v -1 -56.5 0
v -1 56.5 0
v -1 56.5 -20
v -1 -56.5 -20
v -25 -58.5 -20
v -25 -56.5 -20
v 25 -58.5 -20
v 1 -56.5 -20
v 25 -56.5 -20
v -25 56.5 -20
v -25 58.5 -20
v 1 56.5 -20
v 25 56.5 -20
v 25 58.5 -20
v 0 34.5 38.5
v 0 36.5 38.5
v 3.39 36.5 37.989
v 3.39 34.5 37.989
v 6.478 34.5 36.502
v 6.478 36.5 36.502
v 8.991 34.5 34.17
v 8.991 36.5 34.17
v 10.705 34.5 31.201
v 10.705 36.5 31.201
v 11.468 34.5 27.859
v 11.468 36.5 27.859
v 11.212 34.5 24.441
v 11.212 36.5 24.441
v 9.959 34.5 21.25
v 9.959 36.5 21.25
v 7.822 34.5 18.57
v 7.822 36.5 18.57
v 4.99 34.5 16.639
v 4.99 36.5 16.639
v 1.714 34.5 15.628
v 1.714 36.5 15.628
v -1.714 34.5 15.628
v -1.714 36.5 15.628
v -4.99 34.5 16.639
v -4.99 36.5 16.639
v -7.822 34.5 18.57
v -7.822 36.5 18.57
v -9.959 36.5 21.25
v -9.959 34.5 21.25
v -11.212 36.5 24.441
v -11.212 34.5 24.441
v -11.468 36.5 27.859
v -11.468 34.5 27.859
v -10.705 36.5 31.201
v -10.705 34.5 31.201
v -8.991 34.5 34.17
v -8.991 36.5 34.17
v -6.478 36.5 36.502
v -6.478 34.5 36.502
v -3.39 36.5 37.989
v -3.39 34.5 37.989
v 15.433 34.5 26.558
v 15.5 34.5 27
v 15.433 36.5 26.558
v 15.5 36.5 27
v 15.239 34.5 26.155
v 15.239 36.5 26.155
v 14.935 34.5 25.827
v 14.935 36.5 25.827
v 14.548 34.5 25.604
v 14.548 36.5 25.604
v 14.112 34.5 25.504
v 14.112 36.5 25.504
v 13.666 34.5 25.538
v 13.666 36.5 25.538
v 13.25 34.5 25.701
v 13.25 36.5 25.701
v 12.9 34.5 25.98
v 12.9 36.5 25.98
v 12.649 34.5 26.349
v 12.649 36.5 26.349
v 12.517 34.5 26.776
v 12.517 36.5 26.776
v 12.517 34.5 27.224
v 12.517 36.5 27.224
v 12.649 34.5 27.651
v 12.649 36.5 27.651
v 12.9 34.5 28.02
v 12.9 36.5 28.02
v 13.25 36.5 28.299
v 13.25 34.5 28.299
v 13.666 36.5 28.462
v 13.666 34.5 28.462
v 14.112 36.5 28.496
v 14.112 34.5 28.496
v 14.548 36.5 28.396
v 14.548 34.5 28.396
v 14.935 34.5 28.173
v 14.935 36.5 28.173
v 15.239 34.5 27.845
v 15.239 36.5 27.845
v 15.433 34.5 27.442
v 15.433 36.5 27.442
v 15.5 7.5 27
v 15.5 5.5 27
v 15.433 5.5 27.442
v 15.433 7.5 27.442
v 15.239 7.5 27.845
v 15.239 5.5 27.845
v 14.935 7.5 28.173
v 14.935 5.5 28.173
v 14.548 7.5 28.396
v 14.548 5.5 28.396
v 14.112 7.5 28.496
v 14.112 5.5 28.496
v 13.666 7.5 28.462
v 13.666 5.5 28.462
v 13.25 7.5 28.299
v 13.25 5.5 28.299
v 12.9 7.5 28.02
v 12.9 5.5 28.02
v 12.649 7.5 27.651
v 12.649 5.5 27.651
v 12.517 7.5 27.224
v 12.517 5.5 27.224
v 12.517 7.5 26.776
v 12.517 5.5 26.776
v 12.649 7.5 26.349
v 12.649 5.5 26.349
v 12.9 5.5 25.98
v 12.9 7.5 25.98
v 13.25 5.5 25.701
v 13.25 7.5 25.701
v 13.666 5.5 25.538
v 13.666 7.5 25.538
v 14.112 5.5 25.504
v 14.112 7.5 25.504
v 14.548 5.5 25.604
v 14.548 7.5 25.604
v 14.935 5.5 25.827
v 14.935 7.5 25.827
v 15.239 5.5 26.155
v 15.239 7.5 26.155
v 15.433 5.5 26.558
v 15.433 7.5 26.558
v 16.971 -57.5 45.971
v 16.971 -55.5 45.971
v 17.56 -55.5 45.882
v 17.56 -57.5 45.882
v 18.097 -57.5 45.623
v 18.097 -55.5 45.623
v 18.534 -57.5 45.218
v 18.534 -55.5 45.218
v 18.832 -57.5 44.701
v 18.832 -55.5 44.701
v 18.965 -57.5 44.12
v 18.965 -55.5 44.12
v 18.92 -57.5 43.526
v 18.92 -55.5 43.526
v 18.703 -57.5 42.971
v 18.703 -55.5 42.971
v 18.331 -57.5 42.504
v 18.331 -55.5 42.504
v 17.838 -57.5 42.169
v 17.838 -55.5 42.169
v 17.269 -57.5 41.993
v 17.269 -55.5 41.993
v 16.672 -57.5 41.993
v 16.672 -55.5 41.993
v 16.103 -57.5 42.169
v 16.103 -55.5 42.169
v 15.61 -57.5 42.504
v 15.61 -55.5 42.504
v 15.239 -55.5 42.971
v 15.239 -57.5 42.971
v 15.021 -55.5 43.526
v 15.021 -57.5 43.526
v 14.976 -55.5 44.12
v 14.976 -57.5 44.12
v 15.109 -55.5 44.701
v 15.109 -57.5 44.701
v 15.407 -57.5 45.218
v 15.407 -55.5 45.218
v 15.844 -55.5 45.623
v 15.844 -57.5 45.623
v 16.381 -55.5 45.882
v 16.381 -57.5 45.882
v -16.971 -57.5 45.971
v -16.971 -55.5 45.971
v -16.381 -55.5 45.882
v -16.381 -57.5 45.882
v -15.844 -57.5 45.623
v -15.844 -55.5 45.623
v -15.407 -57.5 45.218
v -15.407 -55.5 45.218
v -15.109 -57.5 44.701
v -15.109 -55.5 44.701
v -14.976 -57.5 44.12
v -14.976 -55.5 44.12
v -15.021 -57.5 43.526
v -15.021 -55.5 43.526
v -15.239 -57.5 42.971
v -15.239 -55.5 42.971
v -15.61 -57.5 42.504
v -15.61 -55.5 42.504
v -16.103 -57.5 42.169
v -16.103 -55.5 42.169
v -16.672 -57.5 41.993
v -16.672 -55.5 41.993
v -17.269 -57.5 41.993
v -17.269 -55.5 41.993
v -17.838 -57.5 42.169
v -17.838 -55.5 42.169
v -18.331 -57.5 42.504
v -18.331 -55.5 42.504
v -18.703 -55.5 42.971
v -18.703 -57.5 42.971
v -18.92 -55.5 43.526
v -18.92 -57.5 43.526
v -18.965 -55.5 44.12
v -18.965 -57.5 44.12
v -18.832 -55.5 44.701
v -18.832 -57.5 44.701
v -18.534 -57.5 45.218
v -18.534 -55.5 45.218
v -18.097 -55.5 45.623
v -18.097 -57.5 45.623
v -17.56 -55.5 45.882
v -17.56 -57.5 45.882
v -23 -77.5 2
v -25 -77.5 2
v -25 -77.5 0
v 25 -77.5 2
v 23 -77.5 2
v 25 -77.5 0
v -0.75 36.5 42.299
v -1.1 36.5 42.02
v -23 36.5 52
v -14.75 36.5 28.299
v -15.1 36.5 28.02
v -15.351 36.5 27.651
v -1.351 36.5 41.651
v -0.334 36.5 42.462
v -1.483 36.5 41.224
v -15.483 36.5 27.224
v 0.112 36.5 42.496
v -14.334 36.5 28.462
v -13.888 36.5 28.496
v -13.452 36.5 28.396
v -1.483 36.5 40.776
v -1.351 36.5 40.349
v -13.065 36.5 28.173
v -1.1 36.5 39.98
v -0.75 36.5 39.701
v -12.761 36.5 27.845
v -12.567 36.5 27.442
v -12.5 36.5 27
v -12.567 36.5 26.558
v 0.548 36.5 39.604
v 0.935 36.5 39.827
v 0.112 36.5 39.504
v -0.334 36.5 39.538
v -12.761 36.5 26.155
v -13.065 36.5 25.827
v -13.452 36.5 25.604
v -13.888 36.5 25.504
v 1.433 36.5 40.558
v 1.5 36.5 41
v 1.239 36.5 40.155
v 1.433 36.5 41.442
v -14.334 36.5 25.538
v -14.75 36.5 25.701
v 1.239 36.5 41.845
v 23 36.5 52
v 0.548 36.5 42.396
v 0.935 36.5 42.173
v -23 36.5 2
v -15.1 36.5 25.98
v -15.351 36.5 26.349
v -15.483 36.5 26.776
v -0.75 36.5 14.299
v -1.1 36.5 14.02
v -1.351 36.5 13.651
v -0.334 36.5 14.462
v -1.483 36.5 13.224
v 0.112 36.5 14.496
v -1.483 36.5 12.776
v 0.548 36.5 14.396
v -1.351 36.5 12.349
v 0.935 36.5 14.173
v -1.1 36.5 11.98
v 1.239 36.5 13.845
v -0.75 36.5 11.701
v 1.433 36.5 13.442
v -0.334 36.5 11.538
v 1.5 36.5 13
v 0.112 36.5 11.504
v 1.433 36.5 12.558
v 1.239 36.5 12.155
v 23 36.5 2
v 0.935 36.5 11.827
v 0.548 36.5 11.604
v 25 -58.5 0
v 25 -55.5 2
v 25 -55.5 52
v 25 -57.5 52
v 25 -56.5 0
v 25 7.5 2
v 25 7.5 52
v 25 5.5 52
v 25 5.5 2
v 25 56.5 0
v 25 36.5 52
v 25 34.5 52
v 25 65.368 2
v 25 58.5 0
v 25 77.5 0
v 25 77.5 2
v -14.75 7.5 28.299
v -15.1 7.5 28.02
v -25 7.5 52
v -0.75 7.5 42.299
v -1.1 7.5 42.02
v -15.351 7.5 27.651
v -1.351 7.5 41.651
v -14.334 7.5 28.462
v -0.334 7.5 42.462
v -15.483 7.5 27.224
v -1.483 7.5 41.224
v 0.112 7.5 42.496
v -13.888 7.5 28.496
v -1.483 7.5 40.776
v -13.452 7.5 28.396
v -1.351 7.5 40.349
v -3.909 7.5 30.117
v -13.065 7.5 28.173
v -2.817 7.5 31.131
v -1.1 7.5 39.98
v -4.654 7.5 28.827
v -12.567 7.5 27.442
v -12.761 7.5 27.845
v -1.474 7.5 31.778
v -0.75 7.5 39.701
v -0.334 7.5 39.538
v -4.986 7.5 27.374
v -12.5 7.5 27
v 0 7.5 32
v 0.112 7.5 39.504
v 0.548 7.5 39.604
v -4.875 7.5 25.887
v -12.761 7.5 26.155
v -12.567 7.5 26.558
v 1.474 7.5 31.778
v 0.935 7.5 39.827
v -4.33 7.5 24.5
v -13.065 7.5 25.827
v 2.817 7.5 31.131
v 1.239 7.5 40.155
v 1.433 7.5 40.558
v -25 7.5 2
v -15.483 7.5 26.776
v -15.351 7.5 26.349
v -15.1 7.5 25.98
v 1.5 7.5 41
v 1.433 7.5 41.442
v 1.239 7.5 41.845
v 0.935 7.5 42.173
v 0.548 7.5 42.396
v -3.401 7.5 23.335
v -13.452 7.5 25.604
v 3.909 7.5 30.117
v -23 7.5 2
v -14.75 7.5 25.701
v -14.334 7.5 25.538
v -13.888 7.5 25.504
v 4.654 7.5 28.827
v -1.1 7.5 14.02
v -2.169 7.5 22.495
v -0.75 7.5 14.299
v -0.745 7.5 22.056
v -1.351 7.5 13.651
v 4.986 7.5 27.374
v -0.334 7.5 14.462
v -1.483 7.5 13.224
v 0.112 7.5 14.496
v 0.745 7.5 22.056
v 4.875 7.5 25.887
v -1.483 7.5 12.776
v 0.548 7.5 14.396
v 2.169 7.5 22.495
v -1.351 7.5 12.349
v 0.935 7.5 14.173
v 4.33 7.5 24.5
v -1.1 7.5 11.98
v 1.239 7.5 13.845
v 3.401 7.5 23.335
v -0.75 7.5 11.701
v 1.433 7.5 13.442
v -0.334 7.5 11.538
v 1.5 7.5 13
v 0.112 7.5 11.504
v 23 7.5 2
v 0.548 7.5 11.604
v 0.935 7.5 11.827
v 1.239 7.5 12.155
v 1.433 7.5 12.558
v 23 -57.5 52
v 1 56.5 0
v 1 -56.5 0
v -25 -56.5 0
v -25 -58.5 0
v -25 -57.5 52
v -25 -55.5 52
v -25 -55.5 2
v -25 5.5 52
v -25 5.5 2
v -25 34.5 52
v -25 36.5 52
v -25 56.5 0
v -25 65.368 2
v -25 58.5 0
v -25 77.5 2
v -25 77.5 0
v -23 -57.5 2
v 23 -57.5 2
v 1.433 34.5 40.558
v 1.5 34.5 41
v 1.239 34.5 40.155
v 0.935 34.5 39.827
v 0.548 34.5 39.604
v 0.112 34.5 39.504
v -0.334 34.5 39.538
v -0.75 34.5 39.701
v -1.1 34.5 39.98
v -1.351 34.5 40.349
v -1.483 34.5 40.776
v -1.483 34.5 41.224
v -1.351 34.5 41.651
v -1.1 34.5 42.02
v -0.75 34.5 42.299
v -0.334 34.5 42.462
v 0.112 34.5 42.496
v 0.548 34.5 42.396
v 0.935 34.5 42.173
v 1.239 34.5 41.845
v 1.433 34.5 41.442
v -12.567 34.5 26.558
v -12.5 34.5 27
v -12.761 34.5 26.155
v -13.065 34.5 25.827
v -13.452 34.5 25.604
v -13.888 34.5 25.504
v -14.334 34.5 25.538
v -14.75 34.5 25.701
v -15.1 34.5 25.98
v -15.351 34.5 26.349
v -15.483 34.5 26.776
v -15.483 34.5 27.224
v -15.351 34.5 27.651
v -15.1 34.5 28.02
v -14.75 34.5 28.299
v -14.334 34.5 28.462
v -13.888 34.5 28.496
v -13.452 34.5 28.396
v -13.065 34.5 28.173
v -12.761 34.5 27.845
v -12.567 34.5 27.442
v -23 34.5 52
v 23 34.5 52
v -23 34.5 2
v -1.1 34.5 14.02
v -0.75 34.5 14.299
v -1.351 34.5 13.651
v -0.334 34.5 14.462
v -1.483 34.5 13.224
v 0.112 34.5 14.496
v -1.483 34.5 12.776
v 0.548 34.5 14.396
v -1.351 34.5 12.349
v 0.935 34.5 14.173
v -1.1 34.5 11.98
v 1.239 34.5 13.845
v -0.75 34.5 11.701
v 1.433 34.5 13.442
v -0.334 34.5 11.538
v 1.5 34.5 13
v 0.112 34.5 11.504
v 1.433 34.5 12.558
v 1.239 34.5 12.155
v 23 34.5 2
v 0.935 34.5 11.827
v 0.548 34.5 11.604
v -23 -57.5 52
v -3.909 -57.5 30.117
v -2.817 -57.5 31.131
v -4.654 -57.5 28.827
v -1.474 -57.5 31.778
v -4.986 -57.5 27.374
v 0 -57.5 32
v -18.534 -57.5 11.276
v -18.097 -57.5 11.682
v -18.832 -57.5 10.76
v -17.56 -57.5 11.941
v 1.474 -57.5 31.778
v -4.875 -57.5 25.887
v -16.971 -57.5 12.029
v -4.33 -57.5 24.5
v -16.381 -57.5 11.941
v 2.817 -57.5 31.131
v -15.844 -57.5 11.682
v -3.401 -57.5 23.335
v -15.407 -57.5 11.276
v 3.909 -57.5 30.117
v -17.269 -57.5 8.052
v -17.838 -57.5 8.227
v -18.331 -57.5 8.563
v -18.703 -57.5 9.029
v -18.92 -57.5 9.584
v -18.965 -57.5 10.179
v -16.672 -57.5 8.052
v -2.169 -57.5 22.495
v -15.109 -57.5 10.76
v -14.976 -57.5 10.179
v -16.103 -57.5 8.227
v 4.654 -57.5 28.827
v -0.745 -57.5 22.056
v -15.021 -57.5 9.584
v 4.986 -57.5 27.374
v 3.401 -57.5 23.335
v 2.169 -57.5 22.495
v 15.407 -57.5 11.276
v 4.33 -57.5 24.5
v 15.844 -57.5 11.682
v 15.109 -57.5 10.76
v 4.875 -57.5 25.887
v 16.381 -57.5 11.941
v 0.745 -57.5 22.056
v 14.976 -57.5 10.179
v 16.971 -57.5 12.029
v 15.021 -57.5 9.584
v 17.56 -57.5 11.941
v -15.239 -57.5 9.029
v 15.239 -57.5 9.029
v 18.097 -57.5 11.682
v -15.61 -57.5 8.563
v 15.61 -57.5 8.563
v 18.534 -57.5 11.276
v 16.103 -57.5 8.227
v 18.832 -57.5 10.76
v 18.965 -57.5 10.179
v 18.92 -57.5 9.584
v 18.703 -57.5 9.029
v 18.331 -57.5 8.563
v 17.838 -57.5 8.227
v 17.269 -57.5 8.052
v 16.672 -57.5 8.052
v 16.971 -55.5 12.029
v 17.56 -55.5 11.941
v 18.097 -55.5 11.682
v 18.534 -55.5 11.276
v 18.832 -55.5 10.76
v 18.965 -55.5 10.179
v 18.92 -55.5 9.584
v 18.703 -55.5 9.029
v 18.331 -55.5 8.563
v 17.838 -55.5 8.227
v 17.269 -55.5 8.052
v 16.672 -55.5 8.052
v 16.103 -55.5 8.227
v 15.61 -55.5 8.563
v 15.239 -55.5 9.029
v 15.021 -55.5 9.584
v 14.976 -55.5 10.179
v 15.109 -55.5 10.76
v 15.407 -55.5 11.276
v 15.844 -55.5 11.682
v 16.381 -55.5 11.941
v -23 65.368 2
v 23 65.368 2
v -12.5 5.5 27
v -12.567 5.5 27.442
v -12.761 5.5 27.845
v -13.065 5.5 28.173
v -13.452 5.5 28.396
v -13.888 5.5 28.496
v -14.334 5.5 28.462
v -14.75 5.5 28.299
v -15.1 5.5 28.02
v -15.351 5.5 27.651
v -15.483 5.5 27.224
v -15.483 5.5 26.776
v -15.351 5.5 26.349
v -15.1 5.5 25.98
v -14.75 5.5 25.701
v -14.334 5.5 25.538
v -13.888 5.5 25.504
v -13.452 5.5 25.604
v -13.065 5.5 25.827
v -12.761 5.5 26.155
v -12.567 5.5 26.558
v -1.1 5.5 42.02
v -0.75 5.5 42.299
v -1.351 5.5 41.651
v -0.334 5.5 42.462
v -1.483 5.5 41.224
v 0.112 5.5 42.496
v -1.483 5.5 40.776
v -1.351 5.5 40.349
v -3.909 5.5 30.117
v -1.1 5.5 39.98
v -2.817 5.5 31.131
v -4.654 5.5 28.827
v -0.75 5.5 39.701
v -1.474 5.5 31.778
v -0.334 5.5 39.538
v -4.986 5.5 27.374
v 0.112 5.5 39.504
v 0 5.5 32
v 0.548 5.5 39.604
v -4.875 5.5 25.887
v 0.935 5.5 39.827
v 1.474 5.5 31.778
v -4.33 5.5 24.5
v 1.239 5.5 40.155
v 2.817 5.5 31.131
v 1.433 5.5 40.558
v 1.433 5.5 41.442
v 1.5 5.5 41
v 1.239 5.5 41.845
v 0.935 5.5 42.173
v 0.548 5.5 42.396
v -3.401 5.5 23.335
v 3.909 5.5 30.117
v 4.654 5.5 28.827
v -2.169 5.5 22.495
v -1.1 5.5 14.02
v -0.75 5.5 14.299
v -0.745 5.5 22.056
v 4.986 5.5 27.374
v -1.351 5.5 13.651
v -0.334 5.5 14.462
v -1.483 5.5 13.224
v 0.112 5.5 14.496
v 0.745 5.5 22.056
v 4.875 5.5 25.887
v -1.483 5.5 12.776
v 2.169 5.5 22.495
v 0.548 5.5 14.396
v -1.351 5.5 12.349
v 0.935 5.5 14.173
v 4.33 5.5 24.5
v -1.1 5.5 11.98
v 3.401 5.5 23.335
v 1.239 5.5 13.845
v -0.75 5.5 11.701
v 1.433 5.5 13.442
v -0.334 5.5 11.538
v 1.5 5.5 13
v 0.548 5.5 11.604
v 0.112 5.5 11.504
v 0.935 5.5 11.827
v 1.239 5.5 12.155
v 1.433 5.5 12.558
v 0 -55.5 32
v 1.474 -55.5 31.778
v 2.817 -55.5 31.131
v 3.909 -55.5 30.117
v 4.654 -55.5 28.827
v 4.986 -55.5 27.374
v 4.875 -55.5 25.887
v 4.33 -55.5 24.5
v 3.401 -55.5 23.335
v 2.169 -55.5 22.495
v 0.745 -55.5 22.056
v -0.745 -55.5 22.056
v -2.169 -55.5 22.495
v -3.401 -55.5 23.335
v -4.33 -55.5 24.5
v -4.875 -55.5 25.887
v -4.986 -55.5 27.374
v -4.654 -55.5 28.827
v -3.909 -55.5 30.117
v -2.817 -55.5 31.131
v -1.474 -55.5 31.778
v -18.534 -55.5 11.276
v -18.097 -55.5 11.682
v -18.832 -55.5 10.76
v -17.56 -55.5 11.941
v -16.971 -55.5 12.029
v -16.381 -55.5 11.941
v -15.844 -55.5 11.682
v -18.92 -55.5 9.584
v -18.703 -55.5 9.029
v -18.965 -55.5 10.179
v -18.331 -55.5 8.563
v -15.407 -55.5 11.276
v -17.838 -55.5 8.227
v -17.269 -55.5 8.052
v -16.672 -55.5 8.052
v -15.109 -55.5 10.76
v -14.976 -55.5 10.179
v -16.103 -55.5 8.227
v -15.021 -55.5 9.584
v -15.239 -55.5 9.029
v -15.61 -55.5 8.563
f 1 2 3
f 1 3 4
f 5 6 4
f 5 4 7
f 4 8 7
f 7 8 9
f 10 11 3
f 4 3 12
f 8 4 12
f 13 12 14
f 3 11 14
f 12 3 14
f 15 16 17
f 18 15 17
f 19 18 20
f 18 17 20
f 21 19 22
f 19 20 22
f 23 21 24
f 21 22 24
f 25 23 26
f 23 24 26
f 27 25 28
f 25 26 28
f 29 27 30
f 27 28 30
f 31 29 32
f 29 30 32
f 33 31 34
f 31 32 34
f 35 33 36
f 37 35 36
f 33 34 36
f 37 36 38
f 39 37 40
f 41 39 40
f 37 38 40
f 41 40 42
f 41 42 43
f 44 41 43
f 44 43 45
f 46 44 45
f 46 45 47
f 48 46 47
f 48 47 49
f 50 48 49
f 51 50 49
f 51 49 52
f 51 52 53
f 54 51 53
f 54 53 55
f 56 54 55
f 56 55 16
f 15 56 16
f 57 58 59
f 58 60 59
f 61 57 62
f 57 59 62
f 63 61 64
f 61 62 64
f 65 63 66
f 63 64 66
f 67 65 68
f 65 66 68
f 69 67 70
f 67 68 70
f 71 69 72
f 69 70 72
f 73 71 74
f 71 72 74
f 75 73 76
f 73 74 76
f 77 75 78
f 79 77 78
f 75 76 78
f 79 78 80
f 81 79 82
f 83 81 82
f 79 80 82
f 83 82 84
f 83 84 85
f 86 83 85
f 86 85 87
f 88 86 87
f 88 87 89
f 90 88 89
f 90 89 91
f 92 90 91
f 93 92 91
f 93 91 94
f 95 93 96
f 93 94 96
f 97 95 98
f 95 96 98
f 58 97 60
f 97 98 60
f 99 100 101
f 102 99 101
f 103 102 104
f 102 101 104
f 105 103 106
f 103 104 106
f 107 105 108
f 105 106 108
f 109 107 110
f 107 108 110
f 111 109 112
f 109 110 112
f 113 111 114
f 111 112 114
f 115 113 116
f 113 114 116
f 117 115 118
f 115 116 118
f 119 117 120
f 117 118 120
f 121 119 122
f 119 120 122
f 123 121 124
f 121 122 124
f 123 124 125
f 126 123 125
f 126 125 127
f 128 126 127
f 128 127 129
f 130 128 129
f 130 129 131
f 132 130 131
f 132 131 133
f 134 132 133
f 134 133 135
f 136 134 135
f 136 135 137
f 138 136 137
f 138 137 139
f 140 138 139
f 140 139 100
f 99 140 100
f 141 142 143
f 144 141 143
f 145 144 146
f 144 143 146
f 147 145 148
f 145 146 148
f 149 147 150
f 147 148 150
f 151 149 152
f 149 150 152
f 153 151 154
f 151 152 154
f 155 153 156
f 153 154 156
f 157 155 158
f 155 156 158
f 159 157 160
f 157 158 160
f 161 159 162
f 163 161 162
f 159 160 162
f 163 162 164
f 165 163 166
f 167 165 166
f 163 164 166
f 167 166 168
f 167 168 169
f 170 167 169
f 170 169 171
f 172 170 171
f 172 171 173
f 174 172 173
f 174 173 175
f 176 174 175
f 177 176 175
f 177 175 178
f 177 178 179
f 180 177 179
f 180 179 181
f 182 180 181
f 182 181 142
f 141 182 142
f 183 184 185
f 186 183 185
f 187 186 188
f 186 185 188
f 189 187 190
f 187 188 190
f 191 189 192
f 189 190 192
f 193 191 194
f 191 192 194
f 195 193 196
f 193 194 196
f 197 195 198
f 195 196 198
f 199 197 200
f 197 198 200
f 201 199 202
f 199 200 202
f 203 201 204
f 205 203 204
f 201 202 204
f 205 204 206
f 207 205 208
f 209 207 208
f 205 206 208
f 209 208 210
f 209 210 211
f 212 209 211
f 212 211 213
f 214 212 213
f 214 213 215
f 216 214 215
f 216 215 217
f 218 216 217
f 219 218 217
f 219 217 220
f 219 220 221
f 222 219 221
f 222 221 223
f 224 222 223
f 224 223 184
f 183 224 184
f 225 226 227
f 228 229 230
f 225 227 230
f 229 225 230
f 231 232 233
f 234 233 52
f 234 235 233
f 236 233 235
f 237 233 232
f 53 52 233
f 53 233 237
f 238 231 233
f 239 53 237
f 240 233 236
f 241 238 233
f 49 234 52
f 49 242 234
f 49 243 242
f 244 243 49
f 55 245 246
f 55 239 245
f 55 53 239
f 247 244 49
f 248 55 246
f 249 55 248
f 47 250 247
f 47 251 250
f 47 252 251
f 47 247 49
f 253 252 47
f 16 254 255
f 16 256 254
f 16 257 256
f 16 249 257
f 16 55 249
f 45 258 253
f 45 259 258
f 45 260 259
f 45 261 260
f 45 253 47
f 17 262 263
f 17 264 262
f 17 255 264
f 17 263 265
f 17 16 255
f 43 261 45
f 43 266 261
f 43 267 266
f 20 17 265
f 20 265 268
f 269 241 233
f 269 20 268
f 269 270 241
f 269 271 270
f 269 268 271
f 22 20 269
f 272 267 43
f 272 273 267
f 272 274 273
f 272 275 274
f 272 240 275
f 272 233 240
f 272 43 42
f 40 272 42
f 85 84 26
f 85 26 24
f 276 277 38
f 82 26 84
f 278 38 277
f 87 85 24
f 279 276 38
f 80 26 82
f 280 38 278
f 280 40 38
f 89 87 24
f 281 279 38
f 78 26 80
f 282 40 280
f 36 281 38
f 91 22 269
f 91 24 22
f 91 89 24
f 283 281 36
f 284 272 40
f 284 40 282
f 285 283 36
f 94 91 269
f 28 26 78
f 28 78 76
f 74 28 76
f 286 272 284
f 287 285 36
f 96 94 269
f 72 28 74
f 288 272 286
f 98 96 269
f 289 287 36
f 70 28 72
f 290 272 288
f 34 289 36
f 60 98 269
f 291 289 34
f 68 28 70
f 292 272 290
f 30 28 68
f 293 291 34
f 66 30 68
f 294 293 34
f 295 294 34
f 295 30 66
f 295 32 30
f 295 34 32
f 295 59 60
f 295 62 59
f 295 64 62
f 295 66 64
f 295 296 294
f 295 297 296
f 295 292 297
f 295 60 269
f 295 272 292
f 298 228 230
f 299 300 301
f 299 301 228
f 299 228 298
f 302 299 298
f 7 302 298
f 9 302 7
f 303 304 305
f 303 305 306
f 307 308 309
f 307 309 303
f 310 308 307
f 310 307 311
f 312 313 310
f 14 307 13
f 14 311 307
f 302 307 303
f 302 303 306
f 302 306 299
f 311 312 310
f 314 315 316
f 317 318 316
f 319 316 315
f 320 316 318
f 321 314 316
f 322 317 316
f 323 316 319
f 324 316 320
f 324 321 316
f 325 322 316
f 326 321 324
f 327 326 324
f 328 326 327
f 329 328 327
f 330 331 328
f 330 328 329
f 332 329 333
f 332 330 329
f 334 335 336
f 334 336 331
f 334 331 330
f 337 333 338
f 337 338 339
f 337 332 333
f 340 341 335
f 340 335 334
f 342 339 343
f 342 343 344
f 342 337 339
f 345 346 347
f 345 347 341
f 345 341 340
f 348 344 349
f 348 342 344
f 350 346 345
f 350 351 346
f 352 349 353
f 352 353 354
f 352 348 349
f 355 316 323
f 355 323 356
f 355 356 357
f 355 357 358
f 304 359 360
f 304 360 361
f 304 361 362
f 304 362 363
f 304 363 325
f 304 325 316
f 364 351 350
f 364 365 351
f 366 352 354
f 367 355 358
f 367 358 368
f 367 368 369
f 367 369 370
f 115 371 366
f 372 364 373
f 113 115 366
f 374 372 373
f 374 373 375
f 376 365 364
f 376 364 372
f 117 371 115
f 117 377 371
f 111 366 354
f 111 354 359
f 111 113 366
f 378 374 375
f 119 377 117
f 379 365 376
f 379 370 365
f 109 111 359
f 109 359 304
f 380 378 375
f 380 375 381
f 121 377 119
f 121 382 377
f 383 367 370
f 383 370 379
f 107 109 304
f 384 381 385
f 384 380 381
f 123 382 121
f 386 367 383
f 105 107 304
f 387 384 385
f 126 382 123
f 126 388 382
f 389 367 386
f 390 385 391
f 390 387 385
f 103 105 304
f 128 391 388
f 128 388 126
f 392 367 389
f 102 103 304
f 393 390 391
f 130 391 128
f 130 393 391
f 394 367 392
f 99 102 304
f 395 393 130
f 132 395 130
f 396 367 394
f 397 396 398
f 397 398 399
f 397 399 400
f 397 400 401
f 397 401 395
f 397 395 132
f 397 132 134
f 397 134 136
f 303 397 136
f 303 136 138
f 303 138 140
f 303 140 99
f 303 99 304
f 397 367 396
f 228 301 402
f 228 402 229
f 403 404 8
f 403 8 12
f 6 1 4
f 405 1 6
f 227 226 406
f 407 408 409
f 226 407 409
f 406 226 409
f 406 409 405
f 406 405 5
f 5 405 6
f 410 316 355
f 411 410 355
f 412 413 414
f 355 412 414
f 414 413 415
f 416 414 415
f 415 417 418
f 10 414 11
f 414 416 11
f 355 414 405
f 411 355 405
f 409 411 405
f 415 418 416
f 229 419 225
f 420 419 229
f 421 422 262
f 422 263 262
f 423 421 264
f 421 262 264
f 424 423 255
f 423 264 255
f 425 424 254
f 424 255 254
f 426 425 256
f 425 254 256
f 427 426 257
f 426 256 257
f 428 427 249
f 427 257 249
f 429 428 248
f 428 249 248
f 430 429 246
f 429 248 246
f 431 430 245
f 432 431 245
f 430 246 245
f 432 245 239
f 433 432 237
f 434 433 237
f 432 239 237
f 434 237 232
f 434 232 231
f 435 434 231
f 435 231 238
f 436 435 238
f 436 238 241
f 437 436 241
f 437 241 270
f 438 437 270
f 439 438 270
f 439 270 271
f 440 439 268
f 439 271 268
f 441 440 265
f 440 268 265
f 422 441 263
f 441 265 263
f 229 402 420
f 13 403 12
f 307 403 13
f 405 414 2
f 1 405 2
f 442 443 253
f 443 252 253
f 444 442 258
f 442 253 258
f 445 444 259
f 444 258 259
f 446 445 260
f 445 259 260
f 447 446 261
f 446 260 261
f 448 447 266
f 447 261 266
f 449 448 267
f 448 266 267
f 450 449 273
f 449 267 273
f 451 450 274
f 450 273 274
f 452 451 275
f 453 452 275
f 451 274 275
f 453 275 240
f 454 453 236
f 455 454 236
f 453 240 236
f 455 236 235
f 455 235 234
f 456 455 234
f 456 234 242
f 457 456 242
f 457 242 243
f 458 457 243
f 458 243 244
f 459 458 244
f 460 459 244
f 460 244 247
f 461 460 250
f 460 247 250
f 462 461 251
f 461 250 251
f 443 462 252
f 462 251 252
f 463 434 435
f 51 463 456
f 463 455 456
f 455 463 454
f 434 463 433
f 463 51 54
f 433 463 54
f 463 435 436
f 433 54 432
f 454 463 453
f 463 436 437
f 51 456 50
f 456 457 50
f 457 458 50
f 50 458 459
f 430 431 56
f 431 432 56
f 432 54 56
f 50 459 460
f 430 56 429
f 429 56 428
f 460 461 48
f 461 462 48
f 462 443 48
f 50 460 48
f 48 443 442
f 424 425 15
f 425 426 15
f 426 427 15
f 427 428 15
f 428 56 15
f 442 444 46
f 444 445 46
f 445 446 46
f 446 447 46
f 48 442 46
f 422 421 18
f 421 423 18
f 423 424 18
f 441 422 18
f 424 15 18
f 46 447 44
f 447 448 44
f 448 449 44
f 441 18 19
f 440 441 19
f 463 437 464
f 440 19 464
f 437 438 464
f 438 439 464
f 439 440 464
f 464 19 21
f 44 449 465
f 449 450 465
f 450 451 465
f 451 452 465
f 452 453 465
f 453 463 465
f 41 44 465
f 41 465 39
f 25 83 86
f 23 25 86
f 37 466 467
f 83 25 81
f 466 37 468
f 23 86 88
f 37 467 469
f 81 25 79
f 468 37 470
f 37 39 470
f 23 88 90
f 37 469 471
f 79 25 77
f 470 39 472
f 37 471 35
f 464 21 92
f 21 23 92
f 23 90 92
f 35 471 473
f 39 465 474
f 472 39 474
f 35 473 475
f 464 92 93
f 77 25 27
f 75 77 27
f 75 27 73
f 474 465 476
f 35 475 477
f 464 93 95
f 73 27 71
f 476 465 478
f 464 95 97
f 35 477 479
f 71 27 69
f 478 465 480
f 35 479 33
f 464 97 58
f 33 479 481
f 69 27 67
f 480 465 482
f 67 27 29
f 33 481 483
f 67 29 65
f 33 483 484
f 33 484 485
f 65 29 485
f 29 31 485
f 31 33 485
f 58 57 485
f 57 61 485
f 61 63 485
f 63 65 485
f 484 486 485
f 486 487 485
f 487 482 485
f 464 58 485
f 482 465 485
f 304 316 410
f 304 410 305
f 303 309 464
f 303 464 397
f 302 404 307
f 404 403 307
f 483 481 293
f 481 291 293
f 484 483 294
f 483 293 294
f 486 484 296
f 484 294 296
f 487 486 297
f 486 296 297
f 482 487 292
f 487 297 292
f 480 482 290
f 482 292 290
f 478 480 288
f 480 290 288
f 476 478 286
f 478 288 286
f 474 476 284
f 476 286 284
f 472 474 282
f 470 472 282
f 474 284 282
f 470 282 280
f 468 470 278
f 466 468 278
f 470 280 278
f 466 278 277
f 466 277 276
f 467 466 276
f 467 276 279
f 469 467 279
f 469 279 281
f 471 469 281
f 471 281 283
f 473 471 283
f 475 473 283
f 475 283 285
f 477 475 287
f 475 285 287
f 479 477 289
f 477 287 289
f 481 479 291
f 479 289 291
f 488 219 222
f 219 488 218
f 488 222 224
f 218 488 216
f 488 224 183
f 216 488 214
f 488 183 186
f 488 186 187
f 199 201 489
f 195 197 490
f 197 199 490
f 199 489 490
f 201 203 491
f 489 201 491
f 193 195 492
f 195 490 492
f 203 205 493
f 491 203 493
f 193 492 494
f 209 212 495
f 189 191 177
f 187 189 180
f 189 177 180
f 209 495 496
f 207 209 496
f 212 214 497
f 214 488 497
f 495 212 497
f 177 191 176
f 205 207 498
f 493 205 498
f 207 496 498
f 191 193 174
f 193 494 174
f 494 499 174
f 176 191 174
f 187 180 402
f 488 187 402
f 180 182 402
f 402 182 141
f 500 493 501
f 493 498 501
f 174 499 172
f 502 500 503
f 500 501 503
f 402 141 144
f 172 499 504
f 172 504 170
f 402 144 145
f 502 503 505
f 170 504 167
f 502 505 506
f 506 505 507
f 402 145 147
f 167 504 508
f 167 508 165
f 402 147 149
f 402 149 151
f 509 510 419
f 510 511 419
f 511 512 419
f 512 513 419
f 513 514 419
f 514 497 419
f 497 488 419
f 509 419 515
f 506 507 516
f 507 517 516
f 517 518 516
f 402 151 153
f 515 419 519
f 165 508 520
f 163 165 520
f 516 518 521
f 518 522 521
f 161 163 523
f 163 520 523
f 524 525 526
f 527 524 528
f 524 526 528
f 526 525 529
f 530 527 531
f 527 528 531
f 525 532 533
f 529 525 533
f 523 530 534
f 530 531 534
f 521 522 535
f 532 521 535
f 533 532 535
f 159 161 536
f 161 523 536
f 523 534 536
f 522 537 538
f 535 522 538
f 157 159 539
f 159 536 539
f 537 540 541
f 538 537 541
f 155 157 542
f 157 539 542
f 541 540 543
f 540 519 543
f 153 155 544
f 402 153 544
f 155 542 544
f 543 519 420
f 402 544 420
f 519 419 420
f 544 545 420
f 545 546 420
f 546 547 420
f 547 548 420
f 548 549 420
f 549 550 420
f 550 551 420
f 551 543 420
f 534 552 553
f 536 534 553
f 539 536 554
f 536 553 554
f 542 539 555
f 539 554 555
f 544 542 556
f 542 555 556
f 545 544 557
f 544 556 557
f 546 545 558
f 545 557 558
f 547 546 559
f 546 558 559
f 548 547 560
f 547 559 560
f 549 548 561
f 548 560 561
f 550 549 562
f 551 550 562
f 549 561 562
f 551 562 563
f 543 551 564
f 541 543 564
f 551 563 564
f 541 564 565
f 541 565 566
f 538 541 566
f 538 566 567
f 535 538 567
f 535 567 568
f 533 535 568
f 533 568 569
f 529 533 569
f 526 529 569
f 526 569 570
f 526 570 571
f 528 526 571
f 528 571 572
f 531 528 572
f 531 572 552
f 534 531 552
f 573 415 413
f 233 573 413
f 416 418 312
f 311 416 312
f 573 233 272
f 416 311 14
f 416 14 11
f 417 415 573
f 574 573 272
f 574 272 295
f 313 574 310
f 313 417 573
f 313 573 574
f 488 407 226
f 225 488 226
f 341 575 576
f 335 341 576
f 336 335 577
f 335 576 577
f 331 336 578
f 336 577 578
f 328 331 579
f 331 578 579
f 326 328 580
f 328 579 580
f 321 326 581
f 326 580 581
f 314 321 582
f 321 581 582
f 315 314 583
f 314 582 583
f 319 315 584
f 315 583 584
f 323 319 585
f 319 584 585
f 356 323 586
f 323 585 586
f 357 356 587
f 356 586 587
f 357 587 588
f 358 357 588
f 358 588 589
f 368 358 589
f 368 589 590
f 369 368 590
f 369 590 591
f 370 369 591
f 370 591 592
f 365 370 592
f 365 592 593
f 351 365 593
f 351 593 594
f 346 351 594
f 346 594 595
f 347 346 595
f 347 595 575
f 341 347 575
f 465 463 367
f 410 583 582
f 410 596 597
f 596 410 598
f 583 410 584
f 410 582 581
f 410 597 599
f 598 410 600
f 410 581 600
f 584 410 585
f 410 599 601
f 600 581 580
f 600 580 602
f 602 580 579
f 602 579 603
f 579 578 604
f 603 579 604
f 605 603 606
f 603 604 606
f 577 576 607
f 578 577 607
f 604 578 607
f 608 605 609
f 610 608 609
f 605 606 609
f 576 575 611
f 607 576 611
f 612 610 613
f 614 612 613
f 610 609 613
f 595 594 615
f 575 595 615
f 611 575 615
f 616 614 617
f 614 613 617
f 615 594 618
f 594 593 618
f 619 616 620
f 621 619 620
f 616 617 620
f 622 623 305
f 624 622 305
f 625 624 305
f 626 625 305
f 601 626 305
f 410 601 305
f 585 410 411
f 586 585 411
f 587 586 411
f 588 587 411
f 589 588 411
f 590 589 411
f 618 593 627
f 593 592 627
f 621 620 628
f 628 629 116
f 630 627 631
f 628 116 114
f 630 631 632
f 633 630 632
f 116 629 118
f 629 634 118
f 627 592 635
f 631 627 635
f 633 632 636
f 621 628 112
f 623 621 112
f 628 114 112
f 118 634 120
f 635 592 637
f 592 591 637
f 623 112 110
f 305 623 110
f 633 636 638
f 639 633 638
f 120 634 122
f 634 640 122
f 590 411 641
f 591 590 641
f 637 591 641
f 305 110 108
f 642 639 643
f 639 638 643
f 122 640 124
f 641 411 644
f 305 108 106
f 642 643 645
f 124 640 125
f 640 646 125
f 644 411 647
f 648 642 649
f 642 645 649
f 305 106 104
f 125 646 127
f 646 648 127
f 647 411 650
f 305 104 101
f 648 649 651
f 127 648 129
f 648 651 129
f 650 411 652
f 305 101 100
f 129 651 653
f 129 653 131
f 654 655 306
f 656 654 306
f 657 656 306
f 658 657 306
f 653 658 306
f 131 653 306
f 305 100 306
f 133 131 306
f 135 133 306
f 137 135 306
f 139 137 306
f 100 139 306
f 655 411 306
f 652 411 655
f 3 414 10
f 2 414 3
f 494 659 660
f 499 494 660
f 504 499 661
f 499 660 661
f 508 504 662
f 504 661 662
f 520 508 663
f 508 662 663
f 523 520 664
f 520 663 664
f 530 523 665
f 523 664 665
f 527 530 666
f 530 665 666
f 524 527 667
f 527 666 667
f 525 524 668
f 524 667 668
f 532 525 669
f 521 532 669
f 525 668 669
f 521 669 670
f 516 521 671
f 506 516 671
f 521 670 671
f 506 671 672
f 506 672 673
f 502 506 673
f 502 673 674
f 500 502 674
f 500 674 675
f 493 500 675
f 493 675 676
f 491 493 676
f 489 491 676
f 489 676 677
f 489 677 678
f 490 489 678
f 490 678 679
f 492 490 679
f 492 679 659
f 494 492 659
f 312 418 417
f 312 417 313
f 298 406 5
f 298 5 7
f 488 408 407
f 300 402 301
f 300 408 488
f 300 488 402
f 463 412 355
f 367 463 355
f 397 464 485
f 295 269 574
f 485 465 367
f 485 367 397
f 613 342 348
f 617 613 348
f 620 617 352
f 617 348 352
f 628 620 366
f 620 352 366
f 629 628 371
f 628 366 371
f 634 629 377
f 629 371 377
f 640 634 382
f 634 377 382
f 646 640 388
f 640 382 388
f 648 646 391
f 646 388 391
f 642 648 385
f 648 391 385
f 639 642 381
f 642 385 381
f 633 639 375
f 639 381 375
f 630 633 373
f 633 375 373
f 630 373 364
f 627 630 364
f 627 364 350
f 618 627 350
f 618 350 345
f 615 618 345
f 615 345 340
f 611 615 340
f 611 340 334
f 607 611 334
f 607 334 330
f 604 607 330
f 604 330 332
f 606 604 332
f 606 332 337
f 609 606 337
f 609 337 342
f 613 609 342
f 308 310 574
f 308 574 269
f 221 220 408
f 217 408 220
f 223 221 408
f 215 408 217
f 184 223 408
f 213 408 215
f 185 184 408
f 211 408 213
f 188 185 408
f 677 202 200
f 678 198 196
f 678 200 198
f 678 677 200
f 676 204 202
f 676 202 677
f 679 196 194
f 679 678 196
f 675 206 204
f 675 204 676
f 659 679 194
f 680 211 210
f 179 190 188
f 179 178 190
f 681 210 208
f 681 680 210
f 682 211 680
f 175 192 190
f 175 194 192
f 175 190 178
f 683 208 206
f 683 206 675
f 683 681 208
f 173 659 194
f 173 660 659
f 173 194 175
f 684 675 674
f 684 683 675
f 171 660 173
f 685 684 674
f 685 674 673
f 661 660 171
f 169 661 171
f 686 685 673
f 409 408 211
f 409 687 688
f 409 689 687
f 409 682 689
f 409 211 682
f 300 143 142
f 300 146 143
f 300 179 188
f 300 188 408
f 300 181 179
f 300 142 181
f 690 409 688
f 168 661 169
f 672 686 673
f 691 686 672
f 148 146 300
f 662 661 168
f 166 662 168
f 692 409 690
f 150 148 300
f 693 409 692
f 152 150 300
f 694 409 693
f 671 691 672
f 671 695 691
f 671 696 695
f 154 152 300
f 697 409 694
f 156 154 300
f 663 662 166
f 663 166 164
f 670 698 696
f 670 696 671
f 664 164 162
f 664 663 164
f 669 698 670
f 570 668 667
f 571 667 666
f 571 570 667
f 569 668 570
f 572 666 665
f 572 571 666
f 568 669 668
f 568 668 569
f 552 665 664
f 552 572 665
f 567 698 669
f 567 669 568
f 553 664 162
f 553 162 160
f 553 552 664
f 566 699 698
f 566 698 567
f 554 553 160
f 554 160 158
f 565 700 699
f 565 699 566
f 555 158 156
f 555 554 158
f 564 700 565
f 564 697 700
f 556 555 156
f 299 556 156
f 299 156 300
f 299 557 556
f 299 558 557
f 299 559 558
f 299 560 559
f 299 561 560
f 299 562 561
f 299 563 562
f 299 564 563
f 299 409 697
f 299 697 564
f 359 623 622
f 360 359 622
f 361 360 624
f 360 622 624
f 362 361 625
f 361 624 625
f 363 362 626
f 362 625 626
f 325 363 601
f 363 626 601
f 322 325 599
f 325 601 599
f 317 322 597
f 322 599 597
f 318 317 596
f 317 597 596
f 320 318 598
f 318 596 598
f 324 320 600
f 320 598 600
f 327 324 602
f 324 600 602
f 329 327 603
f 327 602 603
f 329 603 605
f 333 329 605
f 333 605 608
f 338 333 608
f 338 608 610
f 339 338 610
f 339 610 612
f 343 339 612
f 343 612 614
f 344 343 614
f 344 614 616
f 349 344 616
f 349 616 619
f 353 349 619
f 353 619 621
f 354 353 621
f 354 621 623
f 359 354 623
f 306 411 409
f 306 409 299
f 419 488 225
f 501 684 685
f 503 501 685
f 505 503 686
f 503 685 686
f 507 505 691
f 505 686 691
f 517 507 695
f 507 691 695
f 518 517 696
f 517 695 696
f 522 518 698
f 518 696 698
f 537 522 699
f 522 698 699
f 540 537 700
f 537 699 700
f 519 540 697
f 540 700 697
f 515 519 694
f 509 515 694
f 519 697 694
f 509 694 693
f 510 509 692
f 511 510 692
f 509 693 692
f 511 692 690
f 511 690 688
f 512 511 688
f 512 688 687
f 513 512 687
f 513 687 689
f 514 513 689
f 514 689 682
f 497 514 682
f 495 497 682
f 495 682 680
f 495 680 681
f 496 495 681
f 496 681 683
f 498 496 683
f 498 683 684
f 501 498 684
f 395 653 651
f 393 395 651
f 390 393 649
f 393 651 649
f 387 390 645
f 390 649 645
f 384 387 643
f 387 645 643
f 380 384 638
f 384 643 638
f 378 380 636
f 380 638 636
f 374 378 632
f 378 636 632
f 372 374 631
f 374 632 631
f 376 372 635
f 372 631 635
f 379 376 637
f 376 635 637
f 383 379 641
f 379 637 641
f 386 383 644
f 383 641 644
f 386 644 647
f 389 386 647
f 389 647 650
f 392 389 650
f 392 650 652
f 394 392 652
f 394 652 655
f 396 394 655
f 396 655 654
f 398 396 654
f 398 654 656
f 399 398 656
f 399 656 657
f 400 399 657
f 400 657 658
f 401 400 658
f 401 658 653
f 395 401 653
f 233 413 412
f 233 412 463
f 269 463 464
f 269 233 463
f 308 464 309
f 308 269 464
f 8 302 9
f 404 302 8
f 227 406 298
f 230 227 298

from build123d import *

# Parameters (mm, degrees)
SKETCH1_W           = 50
SKETCH1_H           = 155
BOSS_EXTRUDE1_DEPTH = 2
SKETCH2_W           = 50
SKETCH2_H           = 2
BOSS_EXTRUDE2_DEPTH = 50
SKETCH3_W           = 50
SKETCH3_H           = 2
BOSS_EXTRUDE3_DEPTH = 50
SKETCH4_R           = 2
CUT_EXTRUDE1_DEPTH  = 145.97586006
SKETCH5_R           = 5
CUT_EXTRUDE2_DEPTH  = 103.732662771
SKETCH6_R           = 1.5
CUT_EXTRUDE3_DEPTH  = 102.084123382
SKETCH7_W           = 50
SKETCH7_H           = 2
BOSS_EXTRUDE4_DEPTH = 50
CUT_EXTRUDE5_REACH  = 129.769
SKETCH9_R           = 11.5
SKETCH9_R_2         = 1.5
BOSS_EXTRUDE5_DEPTH = 2
BOSS_EXTRUDE6_DEPTH = 20


with BuildPart() as part:
    # Sketch1 → Boss-Extrude1 (new body)
    with BuildSketch(Plane.XY):
        Rectangle(SKETCH1_W, SKETCH1_H)
    extrude(amount=BOSS_EXTRUDE1_DEPTH)

    # Sketch2 → Boss-Extrude2 (add)
    with BuildSketch(Plane.XY.offset(2)):
        with Locations((0, -56.5)):
            Rectangle(SKETCH2_W, SKETCH2_H)
    extrude(amount=BOSS_EXTRUDE2_DEPTH)

    # Sketch3 → Boss-Extrude3 (add)
    with BuildSketch(Plane.XY.offset(2)):
        with Locations((0, 6.5)):
            Rectangle(SKETCH3_W, SKETCH3_H)
    extrude(amount=BOSS_EXTRUDE3_DEPTH)

    # Sketch4 → Cut-Extrude1 (cut, through all)
    with BuildSketch(Plane(origin=(0, -55.5, 0), x_dir=(1, 0, 0), z_dir=(0, 1, 0))):
        with Locations((-16.970562748, -43.970562748)):
            Circle(SKETCH4_R)
        with Locations((16.970562748, -43.970562748)):
            Circle(SKETCH4_R)
        with Locations((16.970562748, -10.029437252)):
            Circle(SKETCH4_R)
        with Locations((-16.970562748, -10.029437252)):
            Circle(SKETCH4_R)
    extrude(amount=-CUT_EXTRUDE1_DEPTH, mode=Mode.SUBTRACT)

    # Sketch5 → Cut-Extrude2 (cut, through all)
    with BuildSketch(Plane(origin=(0, 7.5, 0), x_dir=(1, 0, 0), z_dir=(0, 1, 0))):
        with Locations((0, -27)):
            Circle(SKETCH5_R)
    extrude(amount=-CUT_EXTRUDE2_DEPTH, mode=Mode.SUBTRACT)

    # Sketch6 → Cut-Extrude3 (cut, through all)
    with BuildSketch(Plane.XZ.offset(-5.5)):
        with Locations((0, 41)):
            Circle(SKETCH6_R)
        with Locations((14, 27)):
            Circle(SKETCH6_R)
        with Locations((0, 13)):
            Circle(SKETCH6_R)
        with Locations((-14, 27)):
            Circle(SKETCH6_R)
    extrude(amount=-CUT_EXTRUDE3_DEPTH, mode=Mode.SUBTRACT)

    # Sketch7 → Boss-Extrude4 (add)
    with BuildSketch(Plane.XY.offset(2)):
        with Locations((0, 35.5)):
            Rectangle(SKETCH7_W, SKETCH7_H)
    extrude(amount=BOSS_EXTRUDE4_DEPTH)

    # Sketch9 → Cut-Extrude5 (cut, up to next)
    with BuildSketch(Plane(origin=(0, 36.5, 0), x_dir=(1, 0, 0), z_dir=(0, 1, 0)), mode=Mode.PRIVATE) as cut_extrude5_sk1:
        with Locations((0, -27)):
            Circle(SKETCH9_R)
    cut_extrude5_tool1 = extrude(cut_extrude5_sk1.sketch, amount=-CUT_EXTRUDE5_REACH, mode=Mode.PRIVATE) & part.part
    # Sketch9 → Cut-Extrude5 (cut, up to next)
    with BuildSketch(Plane(origin=(0, 36.5, 0), x_dir=(1, 0, 0), z_dir=(0, 1, 0)), mode=Mode.PRIVATE) as cut_extrude5_sk2:
        with Locations((-14, -27)):
            Circle(SKETCH9_R_2)
    cut_extrude5_tool2 = extrude(cut_extrude5_sk2.sketch, amount=-CUT_EXTRUDE5_REACH, mode=Mode.PRIVATE) & part.part
    # Sketch9 → Cut-Extrude5 (cut, up to next)
    with BuildSketch(Plane(origin=(0, 36.5, 0), x_dir=(1, 0, 0), z_dir=(0, 1, 0)), mode=Mode.PRIVATE) as cut_extrude5_sk3:
        with Locations((0, -41)):
            Circle(SKETCH9_R_2)
    cut_extrude5_tool3 = extrude(cut_extrude5_sk3.sketch, amount=-CUT_EXTRUDE5_REACH, mode=Mode.PRIVATE) & part.part
    # Sketch9 → Cut-Extrude5 (cut, up to next)
    with BuildSketch(Plane(origin=(0, 36.5, 0), x_dir=(1, 0, 0), z_dir=(0, 1, 0)), mode=Mode.PRIVATE) as cut_extrude5_sk4:
        with Locations((14, -27)):
            Circle(SKETCH9_R_2)
    cut_extrude5_tool4 = extrude(cut_extrude5_sk4.sketch, amount=-CUT_EXTRUDE5_REACH, mode=Mode.PRIVATE) & part.part
    # Sketch9 → Cut-Extrude5 (cut, up to next)
    with BuildSketch(Plane(origin=(0, 36.5, 0), x_dir=(1, 0, 0), z_dir=(0, 1, 0)), mode=Mode.PRIVATE) as cut_extrude5_sk5:
        with Locations((0, -13)):
            Circle(SKETCH9_R_2)
    cut_extrude5_tool5 = extrude(cut_extrude5_sk5.sketch, amount=-CUT_EXTRUDE5_REACH, mode=Mode.PRIVATE) & part.part
    add(cut_extrude5_tool1.solids().sort_by_distance((0, 36.5, 27))[0], mode=Mode.SUBTRACT)
    add(cut_extrude5_tool2.solids().sort_by_distance((-14, 36.5, 27))[0], mode=Mode.SUBTRACT)
    add(cut_extrude5_tool3.solids().sort_by_distance((0, 36.5, 41))[0], mode=Mode.SUBTRACT)
    add(cut_extrude5_tool4.solids().sort_by_distance((14, 36.5, 27))[0], mode=Mode.SUBTRACT)
    add(cut_extrude5_tool5.solids().sort_by_distance((0, 36.5, 13))[0], mode=Mode.SUBTRACT)

    # Sketch12 → Boss-Extrude5 (add)
    with BuildSketch(Plane.ZY.offset(25)):
        Polygon((2, 65.367513459), (52, 36.5), (2, 36.5), align=None)
        Polygon((2, -77.5), (2, -57.5), (52, -57.5), align=None)
        Polygon((2, 34.5), (52, 34.5), (2, 7.5), align=None)
    boss_extrude5 = extrude(amount=-BOSS_EXTRUDE5_DEPTH)

    # Mirror1: Boss-Extrude5 across plane
    add(boss_extrude5.mirror(Plane(origin=(0, 0, 0), x_dir=(0, 0, 1), z_dir=(1, 0, 0))))

    # Sketch13 → Boss-Extrude6 (add)
    with BuildSketch(Plane(origin=(0, 0, 0), x_dir=(-1, 0, 0), z_dir=(0, 0, -1))):
        Polygon((-25, 58.5), (25, 58.5), (25, 56.5), (1, 56.5), (1, -56.5), (25, -56.5), (25, -58.5), (-25, -58.5), (-25, -56.5), (-1, -56.5), (-1, 56.5), (-25, 56.5), align=None)
    extrude(amount=BOSS_EXTRUDE6_DEPTH)


solid = part.part
